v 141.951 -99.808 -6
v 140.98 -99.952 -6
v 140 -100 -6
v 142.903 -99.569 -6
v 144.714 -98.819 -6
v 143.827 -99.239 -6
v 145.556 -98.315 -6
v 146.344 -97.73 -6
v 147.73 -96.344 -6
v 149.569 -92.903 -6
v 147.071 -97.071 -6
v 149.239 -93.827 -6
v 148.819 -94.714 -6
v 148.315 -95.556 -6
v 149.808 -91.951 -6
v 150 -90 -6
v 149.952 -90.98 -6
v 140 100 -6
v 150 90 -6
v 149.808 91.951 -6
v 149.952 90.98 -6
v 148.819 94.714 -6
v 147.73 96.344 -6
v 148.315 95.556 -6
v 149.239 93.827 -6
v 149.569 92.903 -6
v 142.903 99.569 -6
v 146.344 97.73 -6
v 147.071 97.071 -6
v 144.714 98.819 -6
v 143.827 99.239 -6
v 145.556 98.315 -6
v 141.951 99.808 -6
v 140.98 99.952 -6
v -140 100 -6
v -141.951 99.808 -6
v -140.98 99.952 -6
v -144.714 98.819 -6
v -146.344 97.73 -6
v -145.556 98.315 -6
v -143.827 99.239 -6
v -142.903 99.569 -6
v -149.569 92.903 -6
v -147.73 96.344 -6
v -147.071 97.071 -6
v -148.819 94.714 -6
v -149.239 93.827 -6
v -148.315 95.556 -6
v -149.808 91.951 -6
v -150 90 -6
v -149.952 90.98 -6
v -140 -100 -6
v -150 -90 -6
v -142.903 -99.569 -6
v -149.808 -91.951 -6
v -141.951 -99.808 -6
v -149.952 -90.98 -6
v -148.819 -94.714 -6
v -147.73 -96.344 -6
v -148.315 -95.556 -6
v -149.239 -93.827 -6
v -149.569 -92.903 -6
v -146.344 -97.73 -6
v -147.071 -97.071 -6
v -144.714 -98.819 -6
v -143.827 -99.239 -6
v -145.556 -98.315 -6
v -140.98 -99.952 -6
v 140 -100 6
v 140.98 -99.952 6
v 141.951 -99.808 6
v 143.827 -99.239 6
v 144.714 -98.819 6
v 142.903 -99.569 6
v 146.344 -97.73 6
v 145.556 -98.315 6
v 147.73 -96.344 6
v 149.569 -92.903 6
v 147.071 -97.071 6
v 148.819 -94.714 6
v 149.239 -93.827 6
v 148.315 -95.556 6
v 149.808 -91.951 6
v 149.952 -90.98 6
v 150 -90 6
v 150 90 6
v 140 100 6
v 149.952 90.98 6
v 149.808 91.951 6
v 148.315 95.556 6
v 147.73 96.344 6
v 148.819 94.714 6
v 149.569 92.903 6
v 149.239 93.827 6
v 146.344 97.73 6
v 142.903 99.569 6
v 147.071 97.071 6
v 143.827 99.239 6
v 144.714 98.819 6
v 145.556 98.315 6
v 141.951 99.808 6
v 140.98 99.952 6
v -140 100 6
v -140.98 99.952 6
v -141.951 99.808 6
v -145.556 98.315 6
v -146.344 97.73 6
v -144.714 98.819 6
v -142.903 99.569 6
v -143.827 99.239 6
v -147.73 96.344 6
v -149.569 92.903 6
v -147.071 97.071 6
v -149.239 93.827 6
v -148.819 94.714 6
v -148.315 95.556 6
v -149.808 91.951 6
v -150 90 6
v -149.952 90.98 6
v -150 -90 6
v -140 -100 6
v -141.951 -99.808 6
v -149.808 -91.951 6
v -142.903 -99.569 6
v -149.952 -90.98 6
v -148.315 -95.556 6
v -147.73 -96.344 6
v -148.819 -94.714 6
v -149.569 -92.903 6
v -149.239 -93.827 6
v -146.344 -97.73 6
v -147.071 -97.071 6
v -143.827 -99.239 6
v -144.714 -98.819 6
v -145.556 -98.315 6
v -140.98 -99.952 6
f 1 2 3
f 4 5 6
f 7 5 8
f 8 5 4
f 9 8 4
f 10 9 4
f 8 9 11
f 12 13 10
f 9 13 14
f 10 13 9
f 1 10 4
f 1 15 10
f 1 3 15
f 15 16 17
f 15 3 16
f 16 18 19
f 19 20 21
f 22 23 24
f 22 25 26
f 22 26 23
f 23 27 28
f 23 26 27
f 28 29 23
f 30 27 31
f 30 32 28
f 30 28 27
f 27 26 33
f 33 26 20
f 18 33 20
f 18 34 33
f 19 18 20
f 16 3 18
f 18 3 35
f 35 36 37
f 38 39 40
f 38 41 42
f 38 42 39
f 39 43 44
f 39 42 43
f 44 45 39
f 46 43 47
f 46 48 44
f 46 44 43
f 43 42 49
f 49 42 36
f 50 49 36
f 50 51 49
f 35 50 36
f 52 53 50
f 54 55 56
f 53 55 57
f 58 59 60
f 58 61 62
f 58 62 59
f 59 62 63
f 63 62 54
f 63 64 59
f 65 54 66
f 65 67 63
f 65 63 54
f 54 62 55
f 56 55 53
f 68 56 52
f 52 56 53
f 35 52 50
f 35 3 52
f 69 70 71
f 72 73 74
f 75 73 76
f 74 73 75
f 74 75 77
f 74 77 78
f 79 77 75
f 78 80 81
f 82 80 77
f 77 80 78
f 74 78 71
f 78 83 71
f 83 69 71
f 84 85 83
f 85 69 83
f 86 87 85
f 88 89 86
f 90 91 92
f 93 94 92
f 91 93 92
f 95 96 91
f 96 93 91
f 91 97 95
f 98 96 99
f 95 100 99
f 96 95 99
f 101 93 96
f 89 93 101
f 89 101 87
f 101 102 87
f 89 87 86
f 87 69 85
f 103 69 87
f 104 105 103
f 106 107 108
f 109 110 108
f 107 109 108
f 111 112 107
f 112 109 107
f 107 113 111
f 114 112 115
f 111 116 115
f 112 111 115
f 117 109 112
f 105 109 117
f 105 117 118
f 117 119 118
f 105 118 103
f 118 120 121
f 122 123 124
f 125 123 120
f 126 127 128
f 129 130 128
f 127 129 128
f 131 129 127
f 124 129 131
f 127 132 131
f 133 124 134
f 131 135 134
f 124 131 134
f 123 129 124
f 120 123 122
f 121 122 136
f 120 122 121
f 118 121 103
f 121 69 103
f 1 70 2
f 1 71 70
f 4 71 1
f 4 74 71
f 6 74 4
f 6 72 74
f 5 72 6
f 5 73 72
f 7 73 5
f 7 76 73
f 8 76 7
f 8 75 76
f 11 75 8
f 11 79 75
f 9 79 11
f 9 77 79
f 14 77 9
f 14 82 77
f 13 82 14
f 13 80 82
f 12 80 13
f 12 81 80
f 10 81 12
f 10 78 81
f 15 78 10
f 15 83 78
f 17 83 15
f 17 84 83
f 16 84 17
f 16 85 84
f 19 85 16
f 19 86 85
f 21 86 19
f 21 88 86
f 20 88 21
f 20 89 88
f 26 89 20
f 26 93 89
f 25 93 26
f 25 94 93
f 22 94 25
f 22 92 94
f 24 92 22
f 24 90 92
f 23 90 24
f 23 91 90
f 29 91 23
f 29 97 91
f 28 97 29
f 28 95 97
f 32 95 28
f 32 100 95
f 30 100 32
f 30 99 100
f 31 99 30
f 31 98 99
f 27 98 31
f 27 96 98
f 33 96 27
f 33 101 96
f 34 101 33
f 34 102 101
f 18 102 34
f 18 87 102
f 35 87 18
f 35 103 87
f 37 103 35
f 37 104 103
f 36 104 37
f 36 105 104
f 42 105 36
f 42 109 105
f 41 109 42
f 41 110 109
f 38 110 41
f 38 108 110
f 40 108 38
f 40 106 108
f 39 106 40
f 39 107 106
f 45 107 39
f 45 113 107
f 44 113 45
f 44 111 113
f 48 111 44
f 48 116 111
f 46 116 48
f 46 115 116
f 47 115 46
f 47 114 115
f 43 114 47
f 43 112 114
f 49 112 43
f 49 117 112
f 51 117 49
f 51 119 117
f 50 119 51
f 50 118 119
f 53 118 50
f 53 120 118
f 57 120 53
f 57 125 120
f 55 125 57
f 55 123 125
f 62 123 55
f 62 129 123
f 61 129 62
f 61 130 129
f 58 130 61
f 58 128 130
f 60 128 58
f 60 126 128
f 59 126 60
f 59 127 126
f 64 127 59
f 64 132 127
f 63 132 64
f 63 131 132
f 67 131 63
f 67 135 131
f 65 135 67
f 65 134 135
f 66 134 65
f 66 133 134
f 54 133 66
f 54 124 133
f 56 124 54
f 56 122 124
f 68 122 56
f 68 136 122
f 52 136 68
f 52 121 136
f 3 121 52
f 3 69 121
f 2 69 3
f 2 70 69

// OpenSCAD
$fn=64;

module tooling_plate(length=200, width=150, thickness=10, corner_r=8) {
    corner_r2 = min(corner_r, min(length, width)/2);
    translate([0,0,0])
    linear_extrude(height=thickness, center=true)
        offset(r=corner_r2)
            square([length-2*corner_r2, width-2*corner_r2], center=true);
}

tooling_plate(length=300, width=200, thickness=12, corner_r=10);
